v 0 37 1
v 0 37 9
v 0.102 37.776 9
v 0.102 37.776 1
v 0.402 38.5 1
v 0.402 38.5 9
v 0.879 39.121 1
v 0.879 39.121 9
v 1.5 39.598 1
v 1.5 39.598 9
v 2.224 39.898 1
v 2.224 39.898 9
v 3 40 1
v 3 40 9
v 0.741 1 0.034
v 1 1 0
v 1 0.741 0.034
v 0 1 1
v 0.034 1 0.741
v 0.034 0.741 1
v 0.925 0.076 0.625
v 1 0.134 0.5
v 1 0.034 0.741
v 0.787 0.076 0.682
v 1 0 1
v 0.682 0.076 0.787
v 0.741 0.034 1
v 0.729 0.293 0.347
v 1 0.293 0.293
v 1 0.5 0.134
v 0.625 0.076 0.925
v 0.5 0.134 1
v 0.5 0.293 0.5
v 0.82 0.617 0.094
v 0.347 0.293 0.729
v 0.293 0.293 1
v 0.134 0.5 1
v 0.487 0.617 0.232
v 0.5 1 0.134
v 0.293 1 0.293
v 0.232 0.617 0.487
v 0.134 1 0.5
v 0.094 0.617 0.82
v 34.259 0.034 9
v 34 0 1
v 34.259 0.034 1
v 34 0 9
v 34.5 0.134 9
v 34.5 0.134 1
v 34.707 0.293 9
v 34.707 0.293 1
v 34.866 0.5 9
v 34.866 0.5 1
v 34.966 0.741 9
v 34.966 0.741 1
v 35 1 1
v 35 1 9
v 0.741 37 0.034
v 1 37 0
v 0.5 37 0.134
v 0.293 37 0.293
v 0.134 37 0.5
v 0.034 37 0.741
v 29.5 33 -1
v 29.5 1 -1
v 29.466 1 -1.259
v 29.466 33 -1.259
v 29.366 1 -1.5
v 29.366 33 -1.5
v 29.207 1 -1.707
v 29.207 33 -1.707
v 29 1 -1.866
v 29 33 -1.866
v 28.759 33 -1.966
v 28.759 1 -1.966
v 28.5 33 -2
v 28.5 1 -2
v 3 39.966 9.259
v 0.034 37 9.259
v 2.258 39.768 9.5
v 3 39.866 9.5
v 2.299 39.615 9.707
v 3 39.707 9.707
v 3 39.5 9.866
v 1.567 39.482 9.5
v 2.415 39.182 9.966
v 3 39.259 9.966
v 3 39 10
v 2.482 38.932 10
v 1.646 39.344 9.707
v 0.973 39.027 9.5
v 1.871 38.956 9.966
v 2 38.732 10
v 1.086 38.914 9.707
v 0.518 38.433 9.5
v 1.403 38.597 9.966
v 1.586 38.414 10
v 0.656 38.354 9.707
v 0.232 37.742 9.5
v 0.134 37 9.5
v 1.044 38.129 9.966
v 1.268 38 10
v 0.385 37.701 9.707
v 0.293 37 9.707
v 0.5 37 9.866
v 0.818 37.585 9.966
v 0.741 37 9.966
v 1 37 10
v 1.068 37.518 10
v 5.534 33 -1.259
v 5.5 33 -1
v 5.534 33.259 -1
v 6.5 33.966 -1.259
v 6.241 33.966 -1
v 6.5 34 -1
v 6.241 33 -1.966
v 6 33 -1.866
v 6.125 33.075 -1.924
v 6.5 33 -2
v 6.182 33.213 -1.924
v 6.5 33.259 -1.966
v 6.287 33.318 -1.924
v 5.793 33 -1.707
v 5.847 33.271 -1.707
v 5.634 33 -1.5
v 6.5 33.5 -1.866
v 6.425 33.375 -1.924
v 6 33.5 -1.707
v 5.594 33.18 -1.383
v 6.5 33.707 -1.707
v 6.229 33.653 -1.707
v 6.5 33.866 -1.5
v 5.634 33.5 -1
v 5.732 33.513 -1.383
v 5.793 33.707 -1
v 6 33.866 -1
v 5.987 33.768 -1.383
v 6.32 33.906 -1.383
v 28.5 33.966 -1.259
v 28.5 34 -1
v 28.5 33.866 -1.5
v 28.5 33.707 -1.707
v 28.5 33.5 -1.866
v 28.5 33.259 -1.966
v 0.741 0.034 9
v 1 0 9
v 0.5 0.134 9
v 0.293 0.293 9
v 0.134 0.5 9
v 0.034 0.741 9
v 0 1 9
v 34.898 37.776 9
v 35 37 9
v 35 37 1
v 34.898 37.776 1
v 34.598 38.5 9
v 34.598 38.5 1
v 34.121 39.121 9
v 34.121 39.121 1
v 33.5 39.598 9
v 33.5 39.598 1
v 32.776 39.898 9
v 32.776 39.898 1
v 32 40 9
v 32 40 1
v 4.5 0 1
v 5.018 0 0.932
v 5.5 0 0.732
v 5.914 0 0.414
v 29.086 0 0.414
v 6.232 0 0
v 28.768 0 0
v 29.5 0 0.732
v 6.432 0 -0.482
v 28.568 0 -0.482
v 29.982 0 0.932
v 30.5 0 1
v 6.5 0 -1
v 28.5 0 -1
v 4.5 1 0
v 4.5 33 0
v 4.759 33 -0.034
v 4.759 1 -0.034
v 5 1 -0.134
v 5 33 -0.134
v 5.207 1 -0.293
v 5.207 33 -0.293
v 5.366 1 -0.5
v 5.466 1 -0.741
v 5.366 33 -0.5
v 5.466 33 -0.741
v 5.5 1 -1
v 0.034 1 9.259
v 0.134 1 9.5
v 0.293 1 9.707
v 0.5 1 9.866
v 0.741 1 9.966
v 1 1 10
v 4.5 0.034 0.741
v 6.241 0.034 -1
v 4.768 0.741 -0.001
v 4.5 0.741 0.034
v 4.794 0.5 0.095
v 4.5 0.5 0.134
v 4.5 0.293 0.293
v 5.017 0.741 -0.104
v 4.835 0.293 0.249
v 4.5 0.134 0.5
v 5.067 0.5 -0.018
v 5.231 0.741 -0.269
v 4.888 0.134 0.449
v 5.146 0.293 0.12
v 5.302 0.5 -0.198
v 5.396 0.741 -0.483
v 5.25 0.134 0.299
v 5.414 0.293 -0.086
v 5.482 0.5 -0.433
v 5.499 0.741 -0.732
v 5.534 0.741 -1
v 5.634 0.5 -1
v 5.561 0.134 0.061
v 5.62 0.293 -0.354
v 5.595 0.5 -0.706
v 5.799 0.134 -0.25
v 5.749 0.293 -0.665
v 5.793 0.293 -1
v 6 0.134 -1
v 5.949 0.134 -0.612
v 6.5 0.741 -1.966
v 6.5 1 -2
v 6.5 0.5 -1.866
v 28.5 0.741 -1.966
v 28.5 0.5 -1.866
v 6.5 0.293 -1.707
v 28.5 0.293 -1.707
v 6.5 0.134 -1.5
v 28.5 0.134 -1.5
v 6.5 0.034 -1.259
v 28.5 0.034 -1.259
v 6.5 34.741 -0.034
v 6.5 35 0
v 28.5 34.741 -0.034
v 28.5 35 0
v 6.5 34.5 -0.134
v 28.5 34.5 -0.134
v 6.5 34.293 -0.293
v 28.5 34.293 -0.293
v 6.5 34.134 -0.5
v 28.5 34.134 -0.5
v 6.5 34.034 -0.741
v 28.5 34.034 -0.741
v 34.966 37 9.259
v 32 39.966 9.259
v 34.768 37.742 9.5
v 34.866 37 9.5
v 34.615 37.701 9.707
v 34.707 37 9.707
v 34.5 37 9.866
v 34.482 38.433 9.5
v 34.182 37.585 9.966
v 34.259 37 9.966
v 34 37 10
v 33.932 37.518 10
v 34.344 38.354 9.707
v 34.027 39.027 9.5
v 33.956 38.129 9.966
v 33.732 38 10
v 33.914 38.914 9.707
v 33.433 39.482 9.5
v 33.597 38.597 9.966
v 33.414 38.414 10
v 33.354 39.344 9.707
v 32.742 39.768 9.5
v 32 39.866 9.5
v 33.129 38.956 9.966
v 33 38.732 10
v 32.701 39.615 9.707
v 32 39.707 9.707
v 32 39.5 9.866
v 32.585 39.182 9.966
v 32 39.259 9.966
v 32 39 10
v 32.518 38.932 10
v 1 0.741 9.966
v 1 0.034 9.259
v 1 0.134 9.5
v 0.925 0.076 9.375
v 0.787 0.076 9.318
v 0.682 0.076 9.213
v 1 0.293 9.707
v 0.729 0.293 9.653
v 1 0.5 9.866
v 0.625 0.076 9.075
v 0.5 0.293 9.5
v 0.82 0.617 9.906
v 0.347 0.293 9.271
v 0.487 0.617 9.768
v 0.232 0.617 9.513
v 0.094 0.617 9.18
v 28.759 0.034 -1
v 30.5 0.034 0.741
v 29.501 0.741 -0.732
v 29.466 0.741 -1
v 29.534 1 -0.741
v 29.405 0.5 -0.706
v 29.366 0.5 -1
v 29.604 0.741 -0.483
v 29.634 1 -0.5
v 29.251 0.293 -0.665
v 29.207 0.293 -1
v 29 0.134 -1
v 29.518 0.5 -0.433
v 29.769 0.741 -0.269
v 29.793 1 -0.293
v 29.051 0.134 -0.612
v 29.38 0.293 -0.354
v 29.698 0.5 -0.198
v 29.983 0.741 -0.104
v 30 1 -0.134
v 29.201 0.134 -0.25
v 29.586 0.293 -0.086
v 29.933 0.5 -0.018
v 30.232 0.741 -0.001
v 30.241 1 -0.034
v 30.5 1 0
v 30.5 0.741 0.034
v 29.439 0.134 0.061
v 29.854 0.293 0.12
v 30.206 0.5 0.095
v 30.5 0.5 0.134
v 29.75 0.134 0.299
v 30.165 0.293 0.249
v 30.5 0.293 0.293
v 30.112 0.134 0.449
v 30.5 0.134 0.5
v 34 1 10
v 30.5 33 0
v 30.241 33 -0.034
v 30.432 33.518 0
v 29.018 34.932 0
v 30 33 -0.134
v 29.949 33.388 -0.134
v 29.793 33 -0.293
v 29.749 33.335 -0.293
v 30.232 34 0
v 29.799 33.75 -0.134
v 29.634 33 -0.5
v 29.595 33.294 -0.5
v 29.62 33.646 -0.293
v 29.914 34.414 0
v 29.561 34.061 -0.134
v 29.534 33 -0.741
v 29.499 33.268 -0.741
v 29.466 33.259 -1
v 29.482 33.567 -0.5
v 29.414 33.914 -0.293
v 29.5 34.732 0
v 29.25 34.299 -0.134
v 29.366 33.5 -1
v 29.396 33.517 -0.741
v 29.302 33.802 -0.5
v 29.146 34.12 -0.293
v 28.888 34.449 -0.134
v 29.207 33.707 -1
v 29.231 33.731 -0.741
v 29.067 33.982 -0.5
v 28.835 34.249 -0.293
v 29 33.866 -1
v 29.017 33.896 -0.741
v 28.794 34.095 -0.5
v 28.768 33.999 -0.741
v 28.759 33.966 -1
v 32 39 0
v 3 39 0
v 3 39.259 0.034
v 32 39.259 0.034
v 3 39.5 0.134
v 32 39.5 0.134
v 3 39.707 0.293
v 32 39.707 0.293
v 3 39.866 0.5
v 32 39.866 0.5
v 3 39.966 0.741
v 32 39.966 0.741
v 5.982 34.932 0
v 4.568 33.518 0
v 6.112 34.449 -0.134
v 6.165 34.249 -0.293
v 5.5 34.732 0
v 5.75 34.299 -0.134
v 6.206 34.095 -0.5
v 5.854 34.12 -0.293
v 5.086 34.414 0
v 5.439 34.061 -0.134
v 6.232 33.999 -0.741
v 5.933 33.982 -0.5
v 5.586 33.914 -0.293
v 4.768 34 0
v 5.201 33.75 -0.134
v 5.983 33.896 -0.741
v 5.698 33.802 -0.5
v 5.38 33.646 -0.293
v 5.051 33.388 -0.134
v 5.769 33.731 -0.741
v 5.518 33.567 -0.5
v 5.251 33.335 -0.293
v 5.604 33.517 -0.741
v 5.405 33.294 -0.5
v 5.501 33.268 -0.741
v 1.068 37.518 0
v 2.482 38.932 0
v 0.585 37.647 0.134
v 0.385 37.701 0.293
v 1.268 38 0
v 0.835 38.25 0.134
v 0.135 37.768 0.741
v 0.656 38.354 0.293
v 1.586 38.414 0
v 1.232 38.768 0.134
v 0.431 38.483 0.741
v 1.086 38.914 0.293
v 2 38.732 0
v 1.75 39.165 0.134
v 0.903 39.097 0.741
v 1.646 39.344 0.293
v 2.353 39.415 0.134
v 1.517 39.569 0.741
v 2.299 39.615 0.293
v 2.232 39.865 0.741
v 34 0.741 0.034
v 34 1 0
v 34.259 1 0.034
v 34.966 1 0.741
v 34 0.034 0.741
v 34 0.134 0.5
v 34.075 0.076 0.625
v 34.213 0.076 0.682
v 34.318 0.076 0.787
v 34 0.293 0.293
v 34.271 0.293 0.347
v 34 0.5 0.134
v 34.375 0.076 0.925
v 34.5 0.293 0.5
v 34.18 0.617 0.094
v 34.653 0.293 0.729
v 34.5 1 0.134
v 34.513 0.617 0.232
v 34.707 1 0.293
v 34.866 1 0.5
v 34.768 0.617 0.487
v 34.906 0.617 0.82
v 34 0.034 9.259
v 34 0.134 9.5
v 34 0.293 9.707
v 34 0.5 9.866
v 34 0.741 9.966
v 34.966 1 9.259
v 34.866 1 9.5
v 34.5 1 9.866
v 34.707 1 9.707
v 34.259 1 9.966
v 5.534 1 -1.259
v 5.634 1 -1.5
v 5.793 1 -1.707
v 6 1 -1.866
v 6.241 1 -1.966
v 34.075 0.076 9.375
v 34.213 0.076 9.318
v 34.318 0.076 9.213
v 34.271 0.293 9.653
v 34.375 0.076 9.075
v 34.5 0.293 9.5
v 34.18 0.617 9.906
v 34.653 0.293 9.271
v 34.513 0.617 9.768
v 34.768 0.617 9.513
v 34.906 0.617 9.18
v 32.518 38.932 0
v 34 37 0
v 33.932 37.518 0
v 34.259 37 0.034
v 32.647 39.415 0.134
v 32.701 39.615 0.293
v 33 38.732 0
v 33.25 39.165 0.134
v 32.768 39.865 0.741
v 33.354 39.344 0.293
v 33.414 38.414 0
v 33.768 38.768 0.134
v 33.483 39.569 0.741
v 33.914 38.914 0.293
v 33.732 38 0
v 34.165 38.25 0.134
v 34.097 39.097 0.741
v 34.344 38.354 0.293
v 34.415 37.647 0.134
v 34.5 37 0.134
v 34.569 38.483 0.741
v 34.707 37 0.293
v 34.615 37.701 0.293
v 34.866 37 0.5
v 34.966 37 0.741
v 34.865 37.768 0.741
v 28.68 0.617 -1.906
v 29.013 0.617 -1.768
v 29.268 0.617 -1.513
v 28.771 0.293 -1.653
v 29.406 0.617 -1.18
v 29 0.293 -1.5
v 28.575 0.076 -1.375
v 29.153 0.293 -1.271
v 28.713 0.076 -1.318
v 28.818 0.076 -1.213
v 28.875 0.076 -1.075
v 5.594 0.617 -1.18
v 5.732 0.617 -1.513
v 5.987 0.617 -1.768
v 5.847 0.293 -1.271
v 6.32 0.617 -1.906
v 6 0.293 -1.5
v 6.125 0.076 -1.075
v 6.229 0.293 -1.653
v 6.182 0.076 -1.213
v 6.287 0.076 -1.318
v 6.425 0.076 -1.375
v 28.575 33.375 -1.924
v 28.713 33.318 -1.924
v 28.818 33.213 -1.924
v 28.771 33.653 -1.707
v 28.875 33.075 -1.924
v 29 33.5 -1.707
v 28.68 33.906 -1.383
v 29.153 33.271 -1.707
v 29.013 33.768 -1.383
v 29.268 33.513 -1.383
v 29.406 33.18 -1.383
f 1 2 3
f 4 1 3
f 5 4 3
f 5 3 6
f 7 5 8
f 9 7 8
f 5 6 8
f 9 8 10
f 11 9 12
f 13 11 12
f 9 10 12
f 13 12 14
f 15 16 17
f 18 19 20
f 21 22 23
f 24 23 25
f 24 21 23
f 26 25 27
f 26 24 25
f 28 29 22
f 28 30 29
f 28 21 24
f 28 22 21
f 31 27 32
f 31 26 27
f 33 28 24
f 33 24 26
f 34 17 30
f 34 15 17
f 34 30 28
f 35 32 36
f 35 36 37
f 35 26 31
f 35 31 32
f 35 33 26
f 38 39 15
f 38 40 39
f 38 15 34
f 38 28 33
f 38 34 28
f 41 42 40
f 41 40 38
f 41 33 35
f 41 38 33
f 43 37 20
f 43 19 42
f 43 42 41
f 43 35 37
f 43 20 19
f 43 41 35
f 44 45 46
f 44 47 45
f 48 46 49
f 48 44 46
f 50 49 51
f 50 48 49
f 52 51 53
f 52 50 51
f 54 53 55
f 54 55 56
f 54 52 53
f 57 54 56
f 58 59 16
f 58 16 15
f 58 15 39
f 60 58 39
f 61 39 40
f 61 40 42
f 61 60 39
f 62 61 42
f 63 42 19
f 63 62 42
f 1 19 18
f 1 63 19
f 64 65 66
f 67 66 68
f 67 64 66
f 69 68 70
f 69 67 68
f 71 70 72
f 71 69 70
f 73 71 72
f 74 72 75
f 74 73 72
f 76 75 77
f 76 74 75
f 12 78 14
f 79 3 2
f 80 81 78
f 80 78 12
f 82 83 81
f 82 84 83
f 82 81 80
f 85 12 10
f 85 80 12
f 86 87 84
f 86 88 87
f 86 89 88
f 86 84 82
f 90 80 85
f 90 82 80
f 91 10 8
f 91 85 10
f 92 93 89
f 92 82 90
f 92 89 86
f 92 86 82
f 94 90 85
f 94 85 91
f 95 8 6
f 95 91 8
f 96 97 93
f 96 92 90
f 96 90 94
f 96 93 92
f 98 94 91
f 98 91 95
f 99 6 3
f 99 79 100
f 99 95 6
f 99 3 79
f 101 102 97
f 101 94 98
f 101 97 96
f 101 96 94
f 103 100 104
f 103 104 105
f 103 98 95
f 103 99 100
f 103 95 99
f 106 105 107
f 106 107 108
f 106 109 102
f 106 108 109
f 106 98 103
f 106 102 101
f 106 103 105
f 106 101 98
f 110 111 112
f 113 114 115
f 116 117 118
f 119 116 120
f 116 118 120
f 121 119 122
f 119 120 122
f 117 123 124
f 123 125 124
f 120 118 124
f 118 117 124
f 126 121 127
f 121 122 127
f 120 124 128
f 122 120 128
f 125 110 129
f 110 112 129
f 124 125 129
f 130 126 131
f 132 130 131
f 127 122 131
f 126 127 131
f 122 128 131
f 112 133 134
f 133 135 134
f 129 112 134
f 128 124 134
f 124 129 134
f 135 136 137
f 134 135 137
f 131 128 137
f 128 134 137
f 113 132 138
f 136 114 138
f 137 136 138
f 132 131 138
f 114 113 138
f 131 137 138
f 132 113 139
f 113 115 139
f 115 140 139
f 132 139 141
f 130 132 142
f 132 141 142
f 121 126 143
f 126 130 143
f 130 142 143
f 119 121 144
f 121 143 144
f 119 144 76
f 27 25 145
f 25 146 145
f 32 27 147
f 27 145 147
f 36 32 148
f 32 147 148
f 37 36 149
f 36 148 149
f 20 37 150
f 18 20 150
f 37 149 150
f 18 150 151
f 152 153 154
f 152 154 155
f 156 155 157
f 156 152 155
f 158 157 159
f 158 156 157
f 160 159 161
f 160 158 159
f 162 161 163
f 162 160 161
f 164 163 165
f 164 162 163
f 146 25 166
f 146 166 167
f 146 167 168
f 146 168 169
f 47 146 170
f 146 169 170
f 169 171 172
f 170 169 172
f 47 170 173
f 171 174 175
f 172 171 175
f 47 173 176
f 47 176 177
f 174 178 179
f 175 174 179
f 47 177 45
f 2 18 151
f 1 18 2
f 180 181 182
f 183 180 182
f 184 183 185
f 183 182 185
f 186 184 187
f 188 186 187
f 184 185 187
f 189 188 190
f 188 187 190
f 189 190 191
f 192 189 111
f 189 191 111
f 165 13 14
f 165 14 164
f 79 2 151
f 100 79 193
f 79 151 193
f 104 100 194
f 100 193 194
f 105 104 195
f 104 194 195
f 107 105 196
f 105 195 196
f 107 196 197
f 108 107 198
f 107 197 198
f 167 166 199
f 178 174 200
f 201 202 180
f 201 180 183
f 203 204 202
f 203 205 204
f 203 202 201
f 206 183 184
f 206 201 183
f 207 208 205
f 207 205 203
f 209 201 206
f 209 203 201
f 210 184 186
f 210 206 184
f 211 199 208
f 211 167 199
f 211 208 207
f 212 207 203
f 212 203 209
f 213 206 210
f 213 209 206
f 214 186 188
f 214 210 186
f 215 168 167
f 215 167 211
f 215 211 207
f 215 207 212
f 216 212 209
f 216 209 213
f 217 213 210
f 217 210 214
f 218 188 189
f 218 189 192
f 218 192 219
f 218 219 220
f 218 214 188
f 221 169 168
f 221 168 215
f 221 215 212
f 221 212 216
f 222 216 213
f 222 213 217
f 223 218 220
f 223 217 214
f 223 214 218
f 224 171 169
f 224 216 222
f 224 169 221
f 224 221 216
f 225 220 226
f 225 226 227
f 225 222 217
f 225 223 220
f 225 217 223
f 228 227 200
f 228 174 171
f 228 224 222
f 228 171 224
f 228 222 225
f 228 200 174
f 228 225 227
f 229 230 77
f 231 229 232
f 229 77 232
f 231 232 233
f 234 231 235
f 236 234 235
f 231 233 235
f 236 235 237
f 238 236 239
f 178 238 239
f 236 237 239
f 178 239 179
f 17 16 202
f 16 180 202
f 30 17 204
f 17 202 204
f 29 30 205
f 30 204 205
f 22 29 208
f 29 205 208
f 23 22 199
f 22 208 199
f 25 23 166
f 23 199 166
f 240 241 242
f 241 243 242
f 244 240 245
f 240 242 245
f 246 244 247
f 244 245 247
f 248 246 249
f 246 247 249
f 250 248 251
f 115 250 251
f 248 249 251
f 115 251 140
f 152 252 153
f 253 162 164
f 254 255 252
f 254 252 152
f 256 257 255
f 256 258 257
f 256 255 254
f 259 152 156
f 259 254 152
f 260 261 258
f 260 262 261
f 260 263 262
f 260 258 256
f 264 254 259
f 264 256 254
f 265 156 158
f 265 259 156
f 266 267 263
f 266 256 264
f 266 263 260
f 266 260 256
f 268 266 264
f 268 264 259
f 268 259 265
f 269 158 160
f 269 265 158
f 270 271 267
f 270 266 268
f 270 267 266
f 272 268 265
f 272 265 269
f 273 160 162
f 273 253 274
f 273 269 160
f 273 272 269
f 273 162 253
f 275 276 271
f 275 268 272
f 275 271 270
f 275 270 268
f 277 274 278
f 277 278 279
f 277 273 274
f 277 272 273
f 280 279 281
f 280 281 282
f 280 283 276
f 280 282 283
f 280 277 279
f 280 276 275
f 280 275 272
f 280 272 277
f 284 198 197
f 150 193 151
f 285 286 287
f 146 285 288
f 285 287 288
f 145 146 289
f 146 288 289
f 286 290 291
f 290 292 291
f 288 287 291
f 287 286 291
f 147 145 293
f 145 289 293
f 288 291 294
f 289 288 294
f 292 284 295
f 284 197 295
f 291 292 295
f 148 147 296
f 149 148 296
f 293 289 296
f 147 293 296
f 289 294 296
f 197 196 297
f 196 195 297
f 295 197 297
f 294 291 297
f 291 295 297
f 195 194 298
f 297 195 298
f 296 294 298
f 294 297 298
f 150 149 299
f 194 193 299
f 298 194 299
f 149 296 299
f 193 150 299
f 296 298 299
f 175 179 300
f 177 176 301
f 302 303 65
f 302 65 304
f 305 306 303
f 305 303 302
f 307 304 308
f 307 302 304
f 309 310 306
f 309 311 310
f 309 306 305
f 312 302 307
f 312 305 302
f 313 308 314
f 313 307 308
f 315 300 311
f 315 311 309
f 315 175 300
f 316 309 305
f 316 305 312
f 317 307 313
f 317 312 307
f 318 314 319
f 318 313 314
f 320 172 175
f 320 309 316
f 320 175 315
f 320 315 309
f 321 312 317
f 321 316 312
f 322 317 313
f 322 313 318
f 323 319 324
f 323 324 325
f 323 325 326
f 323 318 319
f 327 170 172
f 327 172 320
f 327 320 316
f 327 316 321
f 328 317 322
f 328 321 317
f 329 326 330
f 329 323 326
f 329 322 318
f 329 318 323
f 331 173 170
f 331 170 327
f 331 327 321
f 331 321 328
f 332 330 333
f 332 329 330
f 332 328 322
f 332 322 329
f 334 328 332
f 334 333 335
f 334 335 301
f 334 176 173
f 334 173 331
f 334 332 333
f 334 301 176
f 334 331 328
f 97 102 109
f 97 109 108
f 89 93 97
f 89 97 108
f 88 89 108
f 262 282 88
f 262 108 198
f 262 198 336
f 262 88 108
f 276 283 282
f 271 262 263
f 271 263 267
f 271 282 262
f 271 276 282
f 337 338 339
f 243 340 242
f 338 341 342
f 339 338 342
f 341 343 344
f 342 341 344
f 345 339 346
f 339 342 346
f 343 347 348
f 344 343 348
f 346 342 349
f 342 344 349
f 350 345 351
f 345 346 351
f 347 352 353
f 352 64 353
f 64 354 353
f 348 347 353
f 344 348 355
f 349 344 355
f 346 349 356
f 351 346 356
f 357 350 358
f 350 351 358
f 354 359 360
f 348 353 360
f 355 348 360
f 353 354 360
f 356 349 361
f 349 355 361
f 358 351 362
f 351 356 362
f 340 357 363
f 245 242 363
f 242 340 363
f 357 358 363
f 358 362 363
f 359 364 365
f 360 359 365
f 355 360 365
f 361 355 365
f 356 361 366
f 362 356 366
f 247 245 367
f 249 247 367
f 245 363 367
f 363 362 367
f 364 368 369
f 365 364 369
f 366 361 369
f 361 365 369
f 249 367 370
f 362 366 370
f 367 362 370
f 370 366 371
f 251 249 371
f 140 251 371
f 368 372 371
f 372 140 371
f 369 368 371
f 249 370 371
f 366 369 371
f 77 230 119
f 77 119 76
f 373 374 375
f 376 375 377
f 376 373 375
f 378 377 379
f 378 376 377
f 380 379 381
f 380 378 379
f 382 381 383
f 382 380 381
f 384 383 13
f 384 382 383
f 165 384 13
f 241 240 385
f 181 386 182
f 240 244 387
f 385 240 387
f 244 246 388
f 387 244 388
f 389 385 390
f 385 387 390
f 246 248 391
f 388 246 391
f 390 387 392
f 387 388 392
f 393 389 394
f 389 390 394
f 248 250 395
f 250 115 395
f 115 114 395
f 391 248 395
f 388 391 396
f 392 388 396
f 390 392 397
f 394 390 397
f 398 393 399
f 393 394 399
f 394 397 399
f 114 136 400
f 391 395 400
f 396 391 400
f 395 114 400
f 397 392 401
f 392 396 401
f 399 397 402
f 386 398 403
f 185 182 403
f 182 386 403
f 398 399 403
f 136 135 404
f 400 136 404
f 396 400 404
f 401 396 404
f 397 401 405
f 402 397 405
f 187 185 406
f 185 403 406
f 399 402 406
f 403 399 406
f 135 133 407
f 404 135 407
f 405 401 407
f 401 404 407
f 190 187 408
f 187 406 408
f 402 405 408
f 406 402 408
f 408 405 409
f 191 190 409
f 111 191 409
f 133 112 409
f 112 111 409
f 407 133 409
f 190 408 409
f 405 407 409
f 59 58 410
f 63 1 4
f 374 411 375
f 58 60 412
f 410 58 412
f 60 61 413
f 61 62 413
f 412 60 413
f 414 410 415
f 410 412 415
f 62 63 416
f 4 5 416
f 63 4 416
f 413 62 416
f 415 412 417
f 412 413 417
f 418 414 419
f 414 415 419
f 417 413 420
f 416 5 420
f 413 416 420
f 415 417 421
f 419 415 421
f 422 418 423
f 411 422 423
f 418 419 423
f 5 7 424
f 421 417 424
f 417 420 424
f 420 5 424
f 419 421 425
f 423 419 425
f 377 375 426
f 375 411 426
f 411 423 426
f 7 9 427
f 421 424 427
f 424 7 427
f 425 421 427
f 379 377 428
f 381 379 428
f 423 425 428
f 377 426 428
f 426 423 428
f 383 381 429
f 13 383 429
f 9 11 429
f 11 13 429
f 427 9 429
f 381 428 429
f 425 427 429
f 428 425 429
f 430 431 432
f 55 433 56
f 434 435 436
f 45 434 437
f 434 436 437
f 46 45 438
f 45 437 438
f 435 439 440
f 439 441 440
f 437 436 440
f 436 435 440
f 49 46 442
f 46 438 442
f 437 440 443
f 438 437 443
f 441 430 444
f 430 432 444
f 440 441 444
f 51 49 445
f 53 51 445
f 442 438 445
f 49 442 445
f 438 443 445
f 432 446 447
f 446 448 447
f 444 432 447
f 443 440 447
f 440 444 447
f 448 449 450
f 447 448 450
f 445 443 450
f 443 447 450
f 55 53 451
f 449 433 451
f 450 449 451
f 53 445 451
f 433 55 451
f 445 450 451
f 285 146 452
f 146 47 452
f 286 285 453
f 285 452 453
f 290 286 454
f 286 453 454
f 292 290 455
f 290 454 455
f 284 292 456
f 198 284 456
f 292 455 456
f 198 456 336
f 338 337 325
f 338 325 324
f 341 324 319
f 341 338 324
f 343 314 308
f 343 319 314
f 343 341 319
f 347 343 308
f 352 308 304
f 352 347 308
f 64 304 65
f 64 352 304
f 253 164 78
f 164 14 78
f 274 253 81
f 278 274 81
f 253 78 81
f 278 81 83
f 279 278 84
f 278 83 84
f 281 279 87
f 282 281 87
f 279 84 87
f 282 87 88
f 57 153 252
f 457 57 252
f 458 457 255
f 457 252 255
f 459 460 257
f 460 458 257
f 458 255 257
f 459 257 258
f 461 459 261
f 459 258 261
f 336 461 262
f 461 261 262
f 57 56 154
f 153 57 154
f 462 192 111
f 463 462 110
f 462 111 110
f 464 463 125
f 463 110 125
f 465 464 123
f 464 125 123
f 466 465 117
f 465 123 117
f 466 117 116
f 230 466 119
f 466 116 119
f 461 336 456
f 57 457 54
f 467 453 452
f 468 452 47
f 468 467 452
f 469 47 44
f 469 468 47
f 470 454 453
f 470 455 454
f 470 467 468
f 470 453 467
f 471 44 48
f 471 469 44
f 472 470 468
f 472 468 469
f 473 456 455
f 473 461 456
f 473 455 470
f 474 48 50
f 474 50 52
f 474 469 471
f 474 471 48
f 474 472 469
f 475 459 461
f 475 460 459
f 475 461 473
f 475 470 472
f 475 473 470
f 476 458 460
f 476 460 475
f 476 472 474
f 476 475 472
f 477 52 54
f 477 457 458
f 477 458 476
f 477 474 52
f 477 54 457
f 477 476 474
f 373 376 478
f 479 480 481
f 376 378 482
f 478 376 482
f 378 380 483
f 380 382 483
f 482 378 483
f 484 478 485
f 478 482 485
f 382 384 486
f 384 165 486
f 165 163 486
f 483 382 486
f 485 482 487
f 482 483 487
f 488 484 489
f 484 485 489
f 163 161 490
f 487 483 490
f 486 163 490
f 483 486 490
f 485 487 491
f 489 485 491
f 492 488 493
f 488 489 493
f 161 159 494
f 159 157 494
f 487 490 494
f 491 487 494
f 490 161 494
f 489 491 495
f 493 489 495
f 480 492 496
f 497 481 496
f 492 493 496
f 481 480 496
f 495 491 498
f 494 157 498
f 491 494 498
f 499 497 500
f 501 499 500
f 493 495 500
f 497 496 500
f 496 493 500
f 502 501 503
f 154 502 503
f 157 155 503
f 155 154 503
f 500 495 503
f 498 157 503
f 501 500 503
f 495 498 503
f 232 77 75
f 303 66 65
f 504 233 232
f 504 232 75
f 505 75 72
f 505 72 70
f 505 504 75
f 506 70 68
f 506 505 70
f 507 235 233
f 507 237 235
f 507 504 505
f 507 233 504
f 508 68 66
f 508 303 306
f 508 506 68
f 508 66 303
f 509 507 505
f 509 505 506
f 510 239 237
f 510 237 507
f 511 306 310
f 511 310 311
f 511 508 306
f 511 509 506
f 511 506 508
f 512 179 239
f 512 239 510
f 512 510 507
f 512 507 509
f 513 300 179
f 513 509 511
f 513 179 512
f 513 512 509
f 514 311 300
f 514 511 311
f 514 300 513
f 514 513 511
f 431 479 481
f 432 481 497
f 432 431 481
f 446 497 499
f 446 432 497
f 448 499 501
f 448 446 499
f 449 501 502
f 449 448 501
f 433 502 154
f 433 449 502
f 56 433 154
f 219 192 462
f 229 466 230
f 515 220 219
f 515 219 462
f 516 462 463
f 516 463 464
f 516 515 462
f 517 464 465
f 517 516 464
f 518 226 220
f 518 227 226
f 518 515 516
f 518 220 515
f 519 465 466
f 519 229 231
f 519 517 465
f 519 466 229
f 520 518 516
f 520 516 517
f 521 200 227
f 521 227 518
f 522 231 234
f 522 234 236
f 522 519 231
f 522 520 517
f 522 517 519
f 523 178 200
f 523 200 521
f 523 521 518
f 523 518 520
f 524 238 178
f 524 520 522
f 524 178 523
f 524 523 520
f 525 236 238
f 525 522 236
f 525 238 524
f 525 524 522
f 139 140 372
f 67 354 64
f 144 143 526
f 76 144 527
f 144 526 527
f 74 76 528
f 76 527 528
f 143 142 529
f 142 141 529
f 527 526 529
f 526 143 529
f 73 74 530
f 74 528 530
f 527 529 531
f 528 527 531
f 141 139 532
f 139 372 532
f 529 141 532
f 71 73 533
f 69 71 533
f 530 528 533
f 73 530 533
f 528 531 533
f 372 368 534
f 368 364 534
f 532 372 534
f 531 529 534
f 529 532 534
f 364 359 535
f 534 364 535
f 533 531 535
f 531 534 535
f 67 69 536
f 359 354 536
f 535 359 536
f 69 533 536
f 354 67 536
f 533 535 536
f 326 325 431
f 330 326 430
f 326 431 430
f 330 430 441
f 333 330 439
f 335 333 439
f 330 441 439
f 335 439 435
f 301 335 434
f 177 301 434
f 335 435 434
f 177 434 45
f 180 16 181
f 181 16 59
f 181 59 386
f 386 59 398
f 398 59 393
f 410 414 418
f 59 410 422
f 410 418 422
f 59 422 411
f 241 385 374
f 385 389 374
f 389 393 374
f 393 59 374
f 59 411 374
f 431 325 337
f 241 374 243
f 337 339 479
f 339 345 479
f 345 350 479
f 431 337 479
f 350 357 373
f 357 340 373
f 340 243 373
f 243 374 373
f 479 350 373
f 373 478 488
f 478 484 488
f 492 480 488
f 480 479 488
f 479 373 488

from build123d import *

# Parameters (mm, degrees)
SKETCH1_W           = 35
SKETCH1_H           = 40
BOSS_EXTRUDE1_DEPTH = 10
FILLET1_R           = 3
SKETCH2_W           = 24
SKETCH2_H           = 2
BOSS_EXTRUDE2_DEPTH = 34
FILLET2_R           = 1
FILLET3_R           = 1


with BuildPart() as part:
    # Sketch1 → Boss-Extrude1 (new body)
    with BuildSketch(Plane.XY):
        with Locations((17.5, 20)):
            Rectangle(SKETCH1_W, SKETCH1_H)
    extrude(amount=BOSS_EXTRUDE1_DEPTH)

    # Fillet1
    fillet1_edges = [part.edges().sort_by_distance(p)[0] for p in [
        (0, 40, 5),
        (35, 40, 5),
    ]]
    fillet(fillet1_edges, radius=FILLET1_R)

    # Sketch2 → Boss-Extrude2 (add)
    with BuildSketch(Plane.XZ):
        with Locations((17.5, -1)):
            Rectangle(SKETCH2_W, SKETCH2_H)
    extrude(amount=-BOSS_EXTRUDE2_DEPTH)

    # Fillet2
    fillet2_edges = [part.edges().sort_by_distance(p)[0] for p in [
        (5.5, 34, -1),
        (5.5, 17, -2),
        (17.5, 34, 0),
        (5.5, 17, 0),
        (29.5, 34, -1),
        (29.5, 17, 0),
        (17.5, 34, -2),
        (29.5, 17, -2),
    ]]
    fillet(fillet2_edges, radius=FILLET2_R - 0.0001)  # a hair under: the kernel refuses the full size

    # Fillet3
    fillet3_edges = [part.edges().sort_by_distance(p)[0] for p in [
        (35, 18.5, 10),
        (0, 18.5, 0),
        (0, 18.5, 10),
        (17.5, 40, 0),
        (34.121320344, 39.121320344, 0),
        (0.878679656, 39.121320344, 0),
        (17.5, 40, 10),
        (34.121320344, 39.121320344, 10),
        (0.878679656, 39.121320344, 10),
        (32.74995, 0, 0),
        (17.5, 0, -2),
        (29.207136071, 0, -1.707136071),
        (5.792863929, 0, -1.707136071),
        (5.207136071, 0, -0.292863929),
        (29.792863929, 0, -0.292863929),
        (35, 18.5, 0),
        (2.25005, 0, 0),
        (17.5, 0, 10),
        (35, 0, 5),
        (0, 0, 5),
    ]]
    fillet(fillet3_edges, radius=FILLET3_R - 0.0001)  # a hair under: the kernel refuses the full size


solid = part.part
